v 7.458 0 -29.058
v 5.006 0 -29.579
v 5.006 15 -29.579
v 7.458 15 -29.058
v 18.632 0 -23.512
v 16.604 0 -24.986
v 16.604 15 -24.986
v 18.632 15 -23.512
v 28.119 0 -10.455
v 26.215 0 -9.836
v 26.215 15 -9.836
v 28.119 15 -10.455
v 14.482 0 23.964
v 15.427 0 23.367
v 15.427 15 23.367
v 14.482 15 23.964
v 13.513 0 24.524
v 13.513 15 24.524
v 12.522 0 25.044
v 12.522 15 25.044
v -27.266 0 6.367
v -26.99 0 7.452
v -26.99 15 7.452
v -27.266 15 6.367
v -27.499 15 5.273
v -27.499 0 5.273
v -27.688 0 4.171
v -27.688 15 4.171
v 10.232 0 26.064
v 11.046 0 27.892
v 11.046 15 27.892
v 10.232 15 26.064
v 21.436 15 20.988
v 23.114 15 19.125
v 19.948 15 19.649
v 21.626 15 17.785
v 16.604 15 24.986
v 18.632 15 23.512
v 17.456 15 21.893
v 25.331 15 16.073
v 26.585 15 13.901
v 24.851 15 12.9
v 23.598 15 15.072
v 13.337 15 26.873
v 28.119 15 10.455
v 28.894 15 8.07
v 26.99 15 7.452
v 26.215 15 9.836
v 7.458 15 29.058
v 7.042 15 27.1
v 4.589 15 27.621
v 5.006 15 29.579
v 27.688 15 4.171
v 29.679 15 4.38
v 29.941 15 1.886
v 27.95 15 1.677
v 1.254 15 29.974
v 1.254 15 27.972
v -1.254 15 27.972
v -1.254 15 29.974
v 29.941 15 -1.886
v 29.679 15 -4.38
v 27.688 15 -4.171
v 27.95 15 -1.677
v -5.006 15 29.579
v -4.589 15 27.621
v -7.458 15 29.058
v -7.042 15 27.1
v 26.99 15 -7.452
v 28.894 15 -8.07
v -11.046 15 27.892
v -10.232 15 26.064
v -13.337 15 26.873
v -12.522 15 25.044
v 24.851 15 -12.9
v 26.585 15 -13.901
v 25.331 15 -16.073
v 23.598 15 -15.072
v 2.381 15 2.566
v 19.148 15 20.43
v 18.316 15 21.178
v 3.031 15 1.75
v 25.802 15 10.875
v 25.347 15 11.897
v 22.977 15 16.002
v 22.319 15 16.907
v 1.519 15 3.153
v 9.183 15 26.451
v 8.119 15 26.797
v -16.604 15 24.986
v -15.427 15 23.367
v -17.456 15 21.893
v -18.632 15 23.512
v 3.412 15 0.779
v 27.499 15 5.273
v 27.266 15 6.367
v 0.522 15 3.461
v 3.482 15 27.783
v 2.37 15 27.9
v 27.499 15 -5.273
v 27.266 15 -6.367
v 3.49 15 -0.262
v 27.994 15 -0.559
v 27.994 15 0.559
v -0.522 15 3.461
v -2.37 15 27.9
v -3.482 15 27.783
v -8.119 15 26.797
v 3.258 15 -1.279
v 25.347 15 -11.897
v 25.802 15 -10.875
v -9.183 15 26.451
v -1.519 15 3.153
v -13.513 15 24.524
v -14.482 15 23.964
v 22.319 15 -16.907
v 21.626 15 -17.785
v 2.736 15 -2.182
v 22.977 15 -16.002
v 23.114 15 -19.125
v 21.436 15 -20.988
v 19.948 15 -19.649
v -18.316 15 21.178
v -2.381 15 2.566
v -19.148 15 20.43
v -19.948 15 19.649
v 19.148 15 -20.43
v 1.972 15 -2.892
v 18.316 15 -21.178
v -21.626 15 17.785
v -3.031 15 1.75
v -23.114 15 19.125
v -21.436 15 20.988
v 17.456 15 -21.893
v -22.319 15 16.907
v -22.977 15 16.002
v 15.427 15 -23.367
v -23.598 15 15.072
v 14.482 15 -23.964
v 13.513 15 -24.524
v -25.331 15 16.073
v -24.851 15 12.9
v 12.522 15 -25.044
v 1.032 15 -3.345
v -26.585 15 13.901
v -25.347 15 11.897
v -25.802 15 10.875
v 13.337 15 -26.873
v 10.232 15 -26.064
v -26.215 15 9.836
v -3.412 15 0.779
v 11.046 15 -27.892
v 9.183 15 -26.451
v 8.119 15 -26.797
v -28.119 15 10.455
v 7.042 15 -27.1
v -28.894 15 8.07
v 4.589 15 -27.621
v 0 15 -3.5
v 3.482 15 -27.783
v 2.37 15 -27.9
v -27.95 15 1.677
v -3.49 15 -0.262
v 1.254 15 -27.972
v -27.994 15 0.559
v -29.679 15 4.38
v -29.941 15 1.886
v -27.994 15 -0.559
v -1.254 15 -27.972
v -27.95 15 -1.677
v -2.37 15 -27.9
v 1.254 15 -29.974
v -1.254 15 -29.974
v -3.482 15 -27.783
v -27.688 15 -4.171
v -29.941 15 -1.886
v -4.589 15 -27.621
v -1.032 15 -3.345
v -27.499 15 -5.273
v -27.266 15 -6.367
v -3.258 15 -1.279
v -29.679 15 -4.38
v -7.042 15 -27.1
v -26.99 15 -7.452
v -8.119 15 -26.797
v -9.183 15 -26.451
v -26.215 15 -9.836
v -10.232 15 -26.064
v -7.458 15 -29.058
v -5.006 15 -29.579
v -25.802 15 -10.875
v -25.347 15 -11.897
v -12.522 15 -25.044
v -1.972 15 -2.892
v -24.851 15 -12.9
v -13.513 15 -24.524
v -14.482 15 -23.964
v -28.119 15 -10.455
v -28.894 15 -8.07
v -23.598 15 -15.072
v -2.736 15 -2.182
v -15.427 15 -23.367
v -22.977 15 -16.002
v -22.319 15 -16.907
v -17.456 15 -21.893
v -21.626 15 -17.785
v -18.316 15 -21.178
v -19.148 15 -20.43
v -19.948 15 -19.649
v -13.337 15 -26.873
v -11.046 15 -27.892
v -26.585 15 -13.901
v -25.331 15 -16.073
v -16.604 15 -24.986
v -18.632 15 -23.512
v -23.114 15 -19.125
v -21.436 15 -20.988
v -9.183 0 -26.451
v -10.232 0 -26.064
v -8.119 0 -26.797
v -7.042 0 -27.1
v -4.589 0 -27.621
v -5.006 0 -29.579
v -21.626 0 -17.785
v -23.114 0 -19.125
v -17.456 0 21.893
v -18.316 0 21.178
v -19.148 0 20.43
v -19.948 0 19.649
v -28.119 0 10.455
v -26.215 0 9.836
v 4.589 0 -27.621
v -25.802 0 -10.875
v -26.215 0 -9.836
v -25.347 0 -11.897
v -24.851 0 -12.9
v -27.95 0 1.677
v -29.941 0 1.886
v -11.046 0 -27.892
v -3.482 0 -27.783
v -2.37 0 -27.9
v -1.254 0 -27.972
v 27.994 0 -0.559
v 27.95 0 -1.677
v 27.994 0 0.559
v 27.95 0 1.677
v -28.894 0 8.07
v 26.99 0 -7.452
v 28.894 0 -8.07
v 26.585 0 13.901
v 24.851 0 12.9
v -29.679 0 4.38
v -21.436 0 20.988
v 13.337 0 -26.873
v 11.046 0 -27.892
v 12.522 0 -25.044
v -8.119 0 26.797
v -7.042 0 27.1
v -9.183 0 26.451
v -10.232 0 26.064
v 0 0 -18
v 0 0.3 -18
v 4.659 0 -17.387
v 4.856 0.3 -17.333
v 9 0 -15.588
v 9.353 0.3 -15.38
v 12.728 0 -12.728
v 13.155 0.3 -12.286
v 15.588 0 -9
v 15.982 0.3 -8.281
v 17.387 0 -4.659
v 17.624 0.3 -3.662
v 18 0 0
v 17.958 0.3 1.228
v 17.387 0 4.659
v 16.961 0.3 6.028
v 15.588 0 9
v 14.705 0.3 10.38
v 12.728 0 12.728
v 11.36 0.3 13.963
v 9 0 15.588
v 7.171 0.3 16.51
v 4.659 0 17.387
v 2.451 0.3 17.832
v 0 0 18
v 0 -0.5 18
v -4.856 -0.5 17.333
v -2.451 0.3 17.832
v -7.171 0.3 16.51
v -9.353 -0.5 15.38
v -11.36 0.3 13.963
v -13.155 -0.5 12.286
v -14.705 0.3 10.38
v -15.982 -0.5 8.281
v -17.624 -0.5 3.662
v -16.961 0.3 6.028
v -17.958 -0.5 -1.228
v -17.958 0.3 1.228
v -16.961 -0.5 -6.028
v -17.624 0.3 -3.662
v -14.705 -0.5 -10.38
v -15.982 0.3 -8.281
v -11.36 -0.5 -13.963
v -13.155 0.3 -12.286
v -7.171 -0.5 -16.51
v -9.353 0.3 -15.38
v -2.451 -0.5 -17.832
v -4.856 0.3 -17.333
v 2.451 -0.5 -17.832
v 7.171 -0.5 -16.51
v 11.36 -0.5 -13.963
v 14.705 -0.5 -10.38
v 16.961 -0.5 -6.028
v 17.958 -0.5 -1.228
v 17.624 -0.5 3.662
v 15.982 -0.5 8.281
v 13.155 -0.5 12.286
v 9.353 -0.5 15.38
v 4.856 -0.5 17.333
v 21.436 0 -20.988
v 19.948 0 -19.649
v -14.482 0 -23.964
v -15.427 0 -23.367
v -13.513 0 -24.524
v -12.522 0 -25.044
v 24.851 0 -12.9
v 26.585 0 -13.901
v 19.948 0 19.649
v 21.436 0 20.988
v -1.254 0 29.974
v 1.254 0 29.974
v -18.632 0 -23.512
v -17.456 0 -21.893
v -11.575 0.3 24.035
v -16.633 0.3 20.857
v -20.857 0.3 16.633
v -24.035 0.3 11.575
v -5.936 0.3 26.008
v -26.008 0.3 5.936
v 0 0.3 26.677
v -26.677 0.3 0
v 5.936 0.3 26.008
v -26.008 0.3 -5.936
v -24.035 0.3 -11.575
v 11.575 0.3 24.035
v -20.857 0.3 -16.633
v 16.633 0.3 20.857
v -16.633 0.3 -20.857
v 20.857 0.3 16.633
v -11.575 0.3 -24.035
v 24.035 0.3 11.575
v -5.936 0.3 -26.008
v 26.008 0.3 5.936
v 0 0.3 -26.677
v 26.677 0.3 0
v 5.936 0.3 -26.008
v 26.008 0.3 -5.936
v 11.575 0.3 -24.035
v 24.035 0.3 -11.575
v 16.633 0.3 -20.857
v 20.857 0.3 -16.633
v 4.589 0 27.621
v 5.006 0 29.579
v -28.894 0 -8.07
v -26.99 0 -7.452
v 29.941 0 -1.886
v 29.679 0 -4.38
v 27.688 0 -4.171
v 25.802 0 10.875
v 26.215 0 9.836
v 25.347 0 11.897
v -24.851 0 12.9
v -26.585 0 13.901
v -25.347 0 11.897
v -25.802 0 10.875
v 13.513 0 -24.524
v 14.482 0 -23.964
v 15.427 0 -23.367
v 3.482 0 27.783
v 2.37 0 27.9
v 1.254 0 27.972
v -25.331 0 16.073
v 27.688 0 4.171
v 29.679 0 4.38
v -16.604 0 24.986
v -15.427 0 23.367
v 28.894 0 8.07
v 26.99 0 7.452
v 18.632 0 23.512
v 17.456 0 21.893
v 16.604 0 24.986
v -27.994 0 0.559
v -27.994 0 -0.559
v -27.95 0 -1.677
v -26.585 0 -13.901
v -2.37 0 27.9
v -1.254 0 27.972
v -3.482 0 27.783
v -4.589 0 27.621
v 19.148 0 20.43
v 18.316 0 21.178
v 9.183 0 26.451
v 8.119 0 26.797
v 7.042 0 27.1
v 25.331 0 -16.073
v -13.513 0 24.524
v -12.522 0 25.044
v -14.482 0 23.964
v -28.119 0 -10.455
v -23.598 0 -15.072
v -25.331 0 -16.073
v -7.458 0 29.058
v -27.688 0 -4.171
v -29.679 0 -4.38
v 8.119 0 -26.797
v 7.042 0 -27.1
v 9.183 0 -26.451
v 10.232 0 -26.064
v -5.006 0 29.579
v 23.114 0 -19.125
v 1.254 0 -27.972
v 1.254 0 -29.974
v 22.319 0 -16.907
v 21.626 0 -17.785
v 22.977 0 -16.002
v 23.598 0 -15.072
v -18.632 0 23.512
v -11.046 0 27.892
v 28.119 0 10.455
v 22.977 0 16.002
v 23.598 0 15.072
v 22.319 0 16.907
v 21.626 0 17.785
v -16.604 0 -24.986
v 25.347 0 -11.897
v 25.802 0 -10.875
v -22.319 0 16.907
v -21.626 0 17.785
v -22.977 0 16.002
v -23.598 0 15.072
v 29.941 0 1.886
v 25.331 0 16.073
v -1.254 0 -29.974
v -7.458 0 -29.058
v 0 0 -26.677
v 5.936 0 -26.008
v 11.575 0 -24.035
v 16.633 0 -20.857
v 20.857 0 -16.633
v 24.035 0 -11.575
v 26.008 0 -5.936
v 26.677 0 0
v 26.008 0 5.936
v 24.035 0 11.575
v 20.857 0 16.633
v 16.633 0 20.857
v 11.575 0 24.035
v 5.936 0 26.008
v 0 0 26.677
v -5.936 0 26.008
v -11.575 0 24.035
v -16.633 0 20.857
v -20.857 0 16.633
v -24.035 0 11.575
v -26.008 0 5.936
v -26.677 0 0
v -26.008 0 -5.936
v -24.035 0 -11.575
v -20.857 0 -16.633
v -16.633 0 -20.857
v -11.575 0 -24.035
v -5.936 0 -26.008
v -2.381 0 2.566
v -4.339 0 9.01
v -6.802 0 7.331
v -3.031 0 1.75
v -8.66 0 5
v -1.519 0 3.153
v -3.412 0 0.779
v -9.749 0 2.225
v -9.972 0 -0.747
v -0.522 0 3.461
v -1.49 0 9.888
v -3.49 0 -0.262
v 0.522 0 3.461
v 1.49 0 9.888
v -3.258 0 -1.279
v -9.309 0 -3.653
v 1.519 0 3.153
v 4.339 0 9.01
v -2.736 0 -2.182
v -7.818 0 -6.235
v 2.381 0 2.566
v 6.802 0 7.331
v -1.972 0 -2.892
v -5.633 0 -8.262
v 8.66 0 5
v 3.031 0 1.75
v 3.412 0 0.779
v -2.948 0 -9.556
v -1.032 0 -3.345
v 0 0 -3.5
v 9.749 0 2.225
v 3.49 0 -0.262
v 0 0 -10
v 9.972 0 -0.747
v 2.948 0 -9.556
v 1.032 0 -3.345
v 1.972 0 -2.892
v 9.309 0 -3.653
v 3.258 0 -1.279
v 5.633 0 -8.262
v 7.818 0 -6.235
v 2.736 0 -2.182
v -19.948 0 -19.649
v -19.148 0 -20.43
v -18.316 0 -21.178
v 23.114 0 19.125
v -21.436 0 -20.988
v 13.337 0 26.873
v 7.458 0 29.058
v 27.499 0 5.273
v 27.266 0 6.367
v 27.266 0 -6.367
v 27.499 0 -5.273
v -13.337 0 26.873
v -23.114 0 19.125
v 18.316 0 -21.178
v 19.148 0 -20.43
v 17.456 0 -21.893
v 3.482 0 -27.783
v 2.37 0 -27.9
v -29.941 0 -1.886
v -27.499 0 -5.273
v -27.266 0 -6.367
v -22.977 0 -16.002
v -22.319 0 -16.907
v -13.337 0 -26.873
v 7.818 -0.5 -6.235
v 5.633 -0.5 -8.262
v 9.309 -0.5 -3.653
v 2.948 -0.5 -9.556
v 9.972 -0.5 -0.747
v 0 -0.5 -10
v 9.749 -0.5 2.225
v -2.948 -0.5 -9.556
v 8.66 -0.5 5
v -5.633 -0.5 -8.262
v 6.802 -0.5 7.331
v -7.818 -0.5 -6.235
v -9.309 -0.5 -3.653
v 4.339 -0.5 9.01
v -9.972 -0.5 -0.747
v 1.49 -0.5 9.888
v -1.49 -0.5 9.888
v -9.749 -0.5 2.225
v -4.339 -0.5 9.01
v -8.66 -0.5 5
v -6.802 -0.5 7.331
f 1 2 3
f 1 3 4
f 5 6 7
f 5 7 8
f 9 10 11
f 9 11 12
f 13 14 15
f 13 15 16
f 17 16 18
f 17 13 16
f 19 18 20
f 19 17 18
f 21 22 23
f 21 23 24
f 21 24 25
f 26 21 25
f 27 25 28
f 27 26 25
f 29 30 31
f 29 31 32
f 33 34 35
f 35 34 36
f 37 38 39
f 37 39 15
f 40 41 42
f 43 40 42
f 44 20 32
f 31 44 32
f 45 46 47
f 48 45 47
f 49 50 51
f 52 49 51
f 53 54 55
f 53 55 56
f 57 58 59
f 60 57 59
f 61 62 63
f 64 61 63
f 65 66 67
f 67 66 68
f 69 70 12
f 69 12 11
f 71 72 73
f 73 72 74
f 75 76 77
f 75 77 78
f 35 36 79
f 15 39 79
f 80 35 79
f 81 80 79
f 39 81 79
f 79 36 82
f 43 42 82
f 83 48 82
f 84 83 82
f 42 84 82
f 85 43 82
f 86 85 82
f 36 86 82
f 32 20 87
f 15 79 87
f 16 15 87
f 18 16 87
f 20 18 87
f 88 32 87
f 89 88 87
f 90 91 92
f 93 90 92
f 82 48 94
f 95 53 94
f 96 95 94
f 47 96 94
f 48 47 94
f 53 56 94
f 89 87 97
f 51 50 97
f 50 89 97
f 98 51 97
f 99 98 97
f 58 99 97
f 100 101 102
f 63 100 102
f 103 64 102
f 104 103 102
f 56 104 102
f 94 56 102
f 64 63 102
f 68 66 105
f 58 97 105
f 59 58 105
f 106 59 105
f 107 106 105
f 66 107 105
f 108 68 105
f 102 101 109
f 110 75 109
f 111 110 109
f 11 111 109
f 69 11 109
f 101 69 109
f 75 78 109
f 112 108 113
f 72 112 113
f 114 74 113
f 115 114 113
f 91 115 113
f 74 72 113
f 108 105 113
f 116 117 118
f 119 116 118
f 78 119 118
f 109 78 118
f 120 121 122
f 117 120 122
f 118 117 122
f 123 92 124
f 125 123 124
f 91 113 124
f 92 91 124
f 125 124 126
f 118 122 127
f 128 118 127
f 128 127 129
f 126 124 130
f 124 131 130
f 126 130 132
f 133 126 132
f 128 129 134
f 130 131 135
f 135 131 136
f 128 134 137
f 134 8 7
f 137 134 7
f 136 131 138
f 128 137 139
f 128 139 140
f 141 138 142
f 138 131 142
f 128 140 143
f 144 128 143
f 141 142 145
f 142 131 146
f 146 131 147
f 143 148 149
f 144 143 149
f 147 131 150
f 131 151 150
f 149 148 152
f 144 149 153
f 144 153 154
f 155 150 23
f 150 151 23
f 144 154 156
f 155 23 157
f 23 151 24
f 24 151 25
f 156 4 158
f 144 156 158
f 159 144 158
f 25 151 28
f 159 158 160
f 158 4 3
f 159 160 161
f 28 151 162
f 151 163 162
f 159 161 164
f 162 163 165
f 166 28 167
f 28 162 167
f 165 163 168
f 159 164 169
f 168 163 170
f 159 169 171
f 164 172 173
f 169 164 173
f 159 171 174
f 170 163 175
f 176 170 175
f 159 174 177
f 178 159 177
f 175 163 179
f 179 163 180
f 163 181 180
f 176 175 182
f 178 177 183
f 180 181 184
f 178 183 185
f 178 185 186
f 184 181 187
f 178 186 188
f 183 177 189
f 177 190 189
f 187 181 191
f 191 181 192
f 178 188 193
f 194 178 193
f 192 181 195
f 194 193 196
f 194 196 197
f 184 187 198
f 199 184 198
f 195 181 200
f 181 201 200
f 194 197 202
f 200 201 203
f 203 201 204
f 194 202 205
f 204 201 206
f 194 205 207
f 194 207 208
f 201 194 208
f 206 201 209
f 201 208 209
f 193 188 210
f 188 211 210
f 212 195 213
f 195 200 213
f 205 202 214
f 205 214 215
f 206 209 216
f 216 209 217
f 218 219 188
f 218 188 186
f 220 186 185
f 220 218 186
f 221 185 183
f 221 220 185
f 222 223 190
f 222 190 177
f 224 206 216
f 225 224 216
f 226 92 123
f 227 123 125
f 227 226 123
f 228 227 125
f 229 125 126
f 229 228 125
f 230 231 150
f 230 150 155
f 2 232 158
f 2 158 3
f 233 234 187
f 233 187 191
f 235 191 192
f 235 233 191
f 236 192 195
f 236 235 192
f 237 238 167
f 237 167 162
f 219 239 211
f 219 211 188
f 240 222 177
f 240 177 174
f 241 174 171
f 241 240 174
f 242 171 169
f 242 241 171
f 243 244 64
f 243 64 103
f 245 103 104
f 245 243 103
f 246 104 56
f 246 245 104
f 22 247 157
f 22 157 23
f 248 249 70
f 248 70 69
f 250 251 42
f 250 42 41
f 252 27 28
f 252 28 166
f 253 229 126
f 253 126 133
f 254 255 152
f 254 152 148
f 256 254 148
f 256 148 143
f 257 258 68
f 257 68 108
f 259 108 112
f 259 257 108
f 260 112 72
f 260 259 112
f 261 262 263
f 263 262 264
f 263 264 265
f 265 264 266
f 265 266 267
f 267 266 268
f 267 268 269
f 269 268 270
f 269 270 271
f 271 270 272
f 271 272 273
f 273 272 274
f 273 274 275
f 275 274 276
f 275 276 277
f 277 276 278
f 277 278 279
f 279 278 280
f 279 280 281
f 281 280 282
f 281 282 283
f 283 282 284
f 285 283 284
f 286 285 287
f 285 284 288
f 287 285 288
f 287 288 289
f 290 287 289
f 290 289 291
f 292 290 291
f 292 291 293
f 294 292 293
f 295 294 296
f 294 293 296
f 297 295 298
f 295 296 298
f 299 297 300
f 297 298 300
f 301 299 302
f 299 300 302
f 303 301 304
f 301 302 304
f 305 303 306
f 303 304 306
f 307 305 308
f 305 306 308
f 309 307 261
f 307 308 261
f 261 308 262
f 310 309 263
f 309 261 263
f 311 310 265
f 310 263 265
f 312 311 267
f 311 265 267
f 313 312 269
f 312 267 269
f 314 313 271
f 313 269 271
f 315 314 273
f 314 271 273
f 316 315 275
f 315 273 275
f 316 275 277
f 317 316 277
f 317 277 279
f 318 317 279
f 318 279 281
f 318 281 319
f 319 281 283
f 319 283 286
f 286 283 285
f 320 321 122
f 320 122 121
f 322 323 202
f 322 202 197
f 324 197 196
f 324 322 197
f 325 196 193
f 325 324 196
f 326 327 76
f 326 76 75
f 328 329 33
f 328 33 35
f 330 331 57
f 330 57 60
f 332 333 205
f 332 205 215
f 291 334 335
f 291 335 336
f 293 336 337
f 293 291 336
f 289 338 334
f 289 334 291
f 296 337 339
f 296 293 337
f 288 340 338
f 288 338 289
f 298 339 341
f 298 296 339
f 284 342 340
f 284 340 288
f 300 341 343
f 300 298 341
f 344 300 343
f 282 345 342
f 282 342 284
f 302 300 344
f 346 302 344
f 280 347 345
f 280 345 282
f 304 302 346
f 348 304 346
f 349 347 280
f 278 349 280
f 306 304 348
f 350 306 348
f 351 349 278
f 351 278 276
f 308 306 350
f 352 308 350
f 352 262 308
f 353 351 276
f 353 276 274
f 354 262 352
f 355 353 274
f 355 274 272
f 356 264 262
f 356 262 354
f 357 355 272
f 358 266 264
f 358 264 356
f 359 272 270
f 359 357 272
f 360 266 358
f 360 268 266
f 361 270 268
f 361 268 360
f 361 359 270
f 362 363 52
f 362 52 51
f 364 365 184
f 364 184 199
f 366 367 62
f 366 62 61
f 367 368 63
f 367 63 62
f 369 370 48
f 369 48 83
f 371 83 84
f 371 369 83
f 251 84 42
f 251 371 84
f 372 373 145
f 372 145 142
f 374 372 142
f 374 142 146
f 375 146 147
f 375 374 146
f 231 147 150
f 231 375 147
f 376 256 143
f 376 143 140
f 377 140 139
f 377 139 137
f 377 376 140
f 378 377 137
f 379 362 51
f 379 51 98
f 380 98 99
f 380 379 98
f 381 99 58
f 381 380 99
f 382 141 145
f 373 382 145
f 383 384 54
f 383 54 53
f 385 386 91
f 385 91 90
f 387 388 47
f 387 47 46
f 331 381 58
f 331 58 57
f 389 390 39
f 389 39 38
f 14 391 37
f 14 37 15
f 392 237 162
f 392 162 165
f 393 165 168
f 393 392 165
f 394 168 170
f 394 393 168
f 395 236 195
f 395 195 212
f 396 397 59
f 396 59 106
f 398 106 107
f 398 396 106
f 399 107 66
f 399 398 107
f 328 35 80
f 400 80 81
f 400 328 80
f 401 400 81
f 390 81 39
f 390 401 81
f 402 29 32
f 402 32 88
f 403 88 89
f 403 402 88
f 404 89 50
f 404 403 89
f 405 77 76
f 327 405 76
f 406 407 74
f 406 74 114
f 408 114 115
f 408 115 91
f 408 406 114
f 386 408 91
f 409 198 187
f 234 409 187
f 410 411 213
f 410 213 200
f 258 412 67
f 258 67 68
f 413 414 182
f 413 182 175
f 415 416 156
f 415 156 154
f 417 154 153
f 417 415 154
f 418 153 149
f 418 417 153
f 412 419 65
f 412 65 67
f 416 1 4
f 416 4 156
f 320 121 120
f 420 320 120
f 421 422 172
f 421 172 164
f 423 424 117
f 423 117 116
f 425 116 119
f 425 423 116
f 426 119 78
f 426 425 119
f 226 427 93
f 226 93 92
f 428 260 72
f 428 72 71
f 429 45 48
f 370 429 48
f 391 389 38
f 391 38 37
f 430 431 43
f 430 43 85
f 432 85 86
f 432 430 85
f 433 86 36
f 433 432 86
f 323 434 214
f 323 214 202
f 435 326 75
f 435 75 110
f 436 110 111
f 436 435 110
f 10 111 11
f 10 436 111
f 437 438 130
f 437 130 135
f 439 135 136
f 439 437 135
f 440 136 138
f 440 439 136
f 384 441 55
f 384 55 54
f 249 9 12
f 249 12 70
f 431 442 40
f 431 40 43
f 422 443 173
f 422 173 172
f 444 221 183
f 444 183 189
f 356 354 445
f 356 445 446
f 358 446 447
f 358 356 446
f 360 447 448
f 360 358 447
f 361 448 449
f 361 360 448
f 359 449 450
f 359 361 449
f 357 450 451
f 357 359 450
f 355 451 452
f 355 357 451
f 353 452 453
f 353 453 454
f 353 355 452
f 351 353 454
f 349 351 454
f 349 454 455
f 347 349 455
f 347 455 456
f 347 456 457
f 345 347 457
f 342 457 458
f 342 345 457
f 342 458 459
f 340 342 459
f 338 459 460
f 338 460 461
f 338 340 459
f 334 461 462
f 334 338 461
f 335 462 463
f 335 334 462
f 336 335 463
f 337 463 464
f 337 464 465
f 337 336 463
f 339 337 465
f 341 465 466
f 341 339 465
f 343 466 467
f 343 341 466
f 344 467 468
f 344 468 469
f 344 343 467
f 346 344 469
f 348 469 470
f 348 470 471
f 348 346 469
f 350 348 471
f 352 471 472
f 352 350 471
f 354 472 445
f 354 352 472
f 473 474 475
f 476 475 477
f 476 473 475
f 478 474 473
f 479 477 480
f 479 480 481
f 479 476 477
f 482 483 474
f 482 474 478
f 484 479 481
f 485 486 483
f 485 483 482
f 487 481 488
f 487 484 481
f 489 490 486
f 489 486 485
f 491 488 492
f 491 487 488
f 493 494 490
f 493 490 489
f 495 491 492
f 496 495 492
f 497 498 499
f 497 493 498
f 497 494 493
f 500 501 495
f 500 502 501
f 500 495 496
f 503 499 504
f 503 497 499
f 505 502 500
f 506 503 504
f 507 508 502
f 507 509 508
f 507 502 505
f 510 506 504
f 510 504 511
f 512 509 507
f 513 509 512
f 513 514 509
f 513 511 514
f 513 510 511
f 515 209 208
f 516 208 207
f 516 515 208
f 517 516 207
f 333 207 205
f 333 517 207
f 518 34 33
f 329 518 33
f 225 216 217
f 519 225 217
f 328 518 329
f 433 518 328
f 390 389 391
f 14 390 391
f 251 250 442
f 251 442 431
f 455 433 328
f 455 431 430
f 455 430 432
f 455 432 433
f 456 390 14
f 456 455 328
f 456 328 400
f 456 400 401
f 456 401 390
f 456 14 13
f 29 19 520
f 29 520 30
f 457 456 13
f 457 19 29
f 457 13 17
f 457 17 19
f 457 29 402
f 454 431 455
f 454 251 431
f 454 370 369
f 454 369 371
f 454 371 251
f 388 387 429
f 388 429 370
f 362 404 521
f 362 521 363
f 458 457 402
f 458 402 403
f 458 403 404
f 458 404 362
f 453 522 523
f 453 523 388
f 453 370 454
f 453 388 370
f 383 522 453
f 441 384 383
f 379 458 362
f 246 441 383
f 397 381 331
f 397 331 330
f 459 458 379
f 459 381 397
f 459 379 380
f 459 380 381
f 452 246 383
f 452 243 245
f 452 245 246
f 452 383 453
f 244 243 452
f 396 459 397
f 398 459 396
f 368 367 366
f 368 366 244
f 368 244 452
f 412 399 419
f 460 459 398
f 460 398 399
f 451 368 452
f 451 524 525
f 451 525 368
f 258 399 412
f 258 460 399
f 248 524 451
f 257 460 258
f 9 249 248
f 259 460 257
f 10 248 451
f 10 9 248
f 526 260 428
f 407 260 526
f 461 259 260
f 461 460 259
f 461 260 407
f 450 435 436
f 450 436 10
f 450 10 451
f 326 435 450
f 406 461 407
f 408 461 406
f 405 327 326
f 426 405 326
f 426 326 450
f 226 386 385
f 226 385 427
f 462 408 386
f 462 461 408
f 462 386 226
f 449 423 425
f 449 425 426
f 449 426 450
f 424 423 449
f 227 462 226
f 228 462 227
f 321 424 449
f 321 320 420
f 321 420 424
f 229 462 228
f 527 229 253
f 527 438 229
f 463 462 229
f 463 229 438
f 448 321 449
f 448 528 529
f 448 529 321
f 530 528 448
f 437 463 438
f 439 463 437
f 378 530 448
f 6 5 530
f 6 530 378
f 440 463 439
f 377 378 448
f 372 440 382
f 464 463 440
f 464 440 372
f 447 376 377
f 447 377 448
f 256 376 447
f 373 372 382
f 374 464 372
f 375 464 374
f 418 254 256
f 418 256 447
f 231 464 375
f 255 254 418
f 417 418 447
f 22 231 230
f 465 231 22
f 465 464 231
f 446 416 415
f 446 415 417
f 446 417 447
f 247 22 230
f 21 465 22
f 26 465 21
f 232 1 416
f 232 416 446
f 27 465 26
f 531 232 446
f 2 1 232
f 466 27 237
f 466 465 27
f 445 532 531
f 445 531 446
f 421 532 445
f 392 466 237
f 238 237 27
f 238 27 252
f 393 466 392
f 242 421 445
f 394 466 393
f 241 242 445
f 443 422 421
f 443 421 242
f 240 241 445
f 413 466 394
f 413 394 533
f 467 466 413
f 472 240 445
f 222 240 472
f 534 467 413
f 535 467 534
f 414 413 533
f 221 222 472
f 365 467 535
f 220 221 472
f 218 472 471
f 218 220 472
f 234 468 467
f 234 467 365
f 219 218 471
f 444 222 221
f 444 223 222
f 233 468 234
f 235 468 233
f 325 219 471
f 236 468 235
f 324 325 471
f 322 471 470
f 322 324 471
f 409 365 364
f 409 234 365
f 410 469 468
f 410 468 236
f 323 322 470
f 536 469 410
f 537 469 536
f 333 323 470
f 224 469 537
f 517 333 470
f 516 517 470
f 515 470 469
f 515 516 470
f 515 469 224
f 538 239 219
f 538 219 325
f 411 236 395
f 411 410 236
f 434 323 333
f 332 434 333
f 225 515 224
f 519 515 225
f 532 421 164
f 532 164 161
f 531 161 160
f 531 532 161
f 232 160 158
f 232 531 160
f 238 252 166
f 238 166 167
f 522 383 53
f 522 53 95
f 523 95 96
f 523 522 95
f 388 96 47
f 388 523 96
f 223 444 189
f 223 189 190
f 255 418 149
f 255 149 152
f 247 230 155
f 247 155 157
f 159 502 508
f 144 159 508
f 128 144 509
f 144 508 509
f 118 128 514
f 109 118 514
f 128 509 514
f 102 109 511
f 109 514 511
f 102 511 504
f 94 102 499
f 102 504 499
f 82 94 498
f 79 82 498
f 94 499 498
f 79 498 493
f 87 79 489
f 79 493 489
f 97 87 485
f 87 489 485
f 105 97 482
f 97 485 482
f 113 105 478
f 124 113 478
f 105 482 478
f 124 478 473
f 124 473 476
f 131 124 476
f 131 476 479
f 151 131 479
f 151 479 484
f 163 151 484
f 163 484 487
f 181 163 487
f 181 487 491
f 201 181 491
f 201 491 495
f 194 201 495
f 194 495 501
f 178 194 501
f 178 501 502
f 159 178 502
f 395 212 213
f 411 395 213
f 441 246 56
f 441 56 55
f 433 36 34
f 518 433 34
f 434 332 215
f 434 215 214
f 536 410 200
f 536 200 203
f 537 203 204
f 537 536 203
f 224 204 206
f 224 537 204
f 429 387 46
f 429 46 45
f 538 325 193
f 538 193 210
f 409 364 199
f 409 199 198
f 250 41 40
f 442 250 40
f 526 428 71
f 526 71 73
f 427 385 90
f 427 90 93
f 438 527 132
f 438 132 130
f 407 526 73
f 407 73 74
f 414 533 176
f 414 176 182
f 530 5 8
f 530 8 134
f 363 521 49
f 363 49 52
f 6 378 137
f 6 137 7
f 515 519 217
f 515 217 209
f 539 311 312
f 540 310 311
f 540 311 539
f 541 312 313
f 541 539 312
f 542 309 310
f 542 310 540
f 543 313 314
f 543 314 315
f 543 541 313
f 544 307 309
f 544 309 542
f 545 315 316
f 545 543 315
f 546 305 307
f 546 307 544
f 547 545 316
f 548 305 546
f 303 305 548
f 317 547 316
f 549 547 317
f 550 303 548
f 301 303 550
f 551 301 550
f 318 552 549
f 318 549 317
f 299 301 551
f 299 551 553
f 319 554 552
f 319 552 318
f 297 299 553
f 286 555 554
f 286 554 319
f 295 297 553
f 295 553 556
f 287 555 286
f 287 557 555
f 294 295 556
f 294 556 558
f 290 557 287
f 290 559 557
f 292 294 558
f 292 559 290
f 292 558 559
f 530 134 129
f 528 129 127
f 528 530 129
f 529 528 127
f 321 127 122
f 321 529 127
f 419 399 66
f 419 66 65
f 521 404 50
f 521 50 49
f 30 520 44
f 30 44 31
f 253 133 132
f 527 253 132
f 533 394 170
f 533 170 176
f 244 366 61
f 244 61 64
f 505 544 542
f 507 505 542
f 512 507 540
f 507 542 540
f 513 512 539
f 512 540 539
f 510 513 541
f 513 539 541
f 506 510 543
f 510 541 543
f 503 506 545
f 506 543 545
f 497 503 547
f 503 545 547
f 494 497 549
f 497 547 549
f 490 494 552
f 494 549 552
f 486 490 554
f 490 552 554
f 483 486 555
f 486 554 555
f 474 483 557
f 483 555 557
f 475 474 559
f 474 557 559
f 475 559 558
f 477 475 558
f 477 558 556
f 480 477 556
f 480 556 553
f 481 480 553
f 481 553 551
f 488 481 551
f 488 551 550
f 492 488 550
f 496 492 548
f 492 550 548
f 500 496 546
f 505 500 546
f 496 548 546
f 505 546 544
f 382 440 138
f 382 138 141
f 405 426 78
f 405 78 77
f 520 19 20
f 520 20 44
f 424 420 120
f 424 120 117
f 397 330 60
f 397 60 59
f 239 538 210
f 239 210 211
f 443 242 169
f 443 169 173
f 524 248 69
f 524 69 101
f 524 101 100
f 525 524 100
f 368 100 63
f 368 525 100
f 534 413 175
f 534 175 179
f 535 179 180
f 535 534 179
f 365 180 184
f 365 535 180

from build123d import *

# Parameters (mm, degrees)
SALIENTE_EXTRUIR1_DEPTH = 15
CROQUIS3_R              = 18
SALIENTE_EXTRUIR2_DEPTH = 0.5
CROQUIS4_R              = 3.5
CORTAR_EXTRUIR1_DEPTH   = 24.5
CROQUIS5_R              = 10
CORTAR_EXTRUIR2_DEPTH   = 0.5
CORTAR_EXTRUIR3_START   = -0.3
CROQUIS6_R              = 26.676513241
CROQUIS6_R_2            = 18
CORTAR_EXTRUIR3_DEPTH   = 0.3


with BuildPart() as part:
    # Croquis2 → Saliente-Extruir1 (new body)
    with BuildSketch(Plane(origin=(0, 0, 0), x_dir=(1, 0, 0), z_dir=(0, 1, 0))):
        with BuildLine():
            Line((-1.253633745, 27.971921679), (-1.253633745, 29.973795262))
            Line((-1.253633745, 29.973795262), (1.253633745, 29.973795262))
            Line((1.253633745, 29.973795262), (1.253633745, 27.971921679))
            ThreePointArc((1.253633745, 27.971921679), (2.926796971, 27.84661307), (4.589450692, 27.62131319))
            Line((4.589450692, 27.62131319), (5.005663613, 29.579441032))
            Line((5.005663613, 29.579441032), (7.458141293, 29.058150809))
            Line((7.458141293, 29.058150809), (7.041928372, 27.100022967))
            ThreePointArc((7.041928372, 27.100022967), (8.652475842, 26.629582456), (10.231954111, 26.063520773))
            Line((10.231954111, 26.063520773), (11.046189452, 27.892323292))
            Line((11.046189452, 27.892323292), (13.336692279, 26.872525729))
            Line((13.336692279, 26.872525729), (12.522456938, 25.04372321))
            ThreePointArc((12.522456938, 25.04372321), (14, 24.248711306), (15.427272037, 23.366627431))
            Line((15.427272037, 23.366627431), (16.603943806, 24.98617718))
            Line((16.603943806, 24.98617718), (18.632365815, 23.512442326))
            Line((18.632365815, 23.512442326), (17.455694046, 21.892892577))
            ThreePointArc((17.455694046, 21.892892577), (18.735656978, 20.808055113), (19.948344146, 19.648500345))
            Line((19.948344146, 19.648500345), (21.436026141, 20.98801523))
            Line((21.436026141, 20.98801523), (23.113715557, 19.124752368))
            Line((23.113715557, 19.124752368), (21.626033563, 17.785237483))
            ThreePointArc((21.626033563, 17.785237483), (22.652475842, 16.457987064), (23.597577894, 15.07163951))
            Line((23.597577894, 15.07163951), (25.331251272, 16.072576302))
            Line((25.331251272, 16.072576302), (26.584885018, 13.901218961))
            Line((26.584885018, 13.901218961), (24.85121164, 12.900282169))
            ThreePointArc((24.85121164, 12.900282169), (25.579272814, 11.388626006), (26.215484254, 9.836075707))
            Line((26.215484254, 9.836075707), (28.11937917, 10.454688665))
            Line((28.11937917, 10.454688665), (28.894167434, 8.070135579))
            Line((28.894167434, 8.070135579), (26.990272518, 7.451522622))
            ThreePointArc((26.990272518, 7.451522622), (27.388132821, 5.821527343), (27.687648157, 4.170628196))
            Line((27.687648157, 4.170628196), (29.678555267, 4.379880966))
            Line((29.678555267, 4.379880966), (29.940636085, 1.886348549))
            Line((29.940636085, 1.886348549), (27.949728974, 1.677095779))
            ThreePointArc((27.949728974, 1.677095779), (28, 0), (27.949728974, -1.677095779))
            Line((27.949728974, -1.677095779), (29.940636085, -1.886348549))
            Line((29.940636085, -1.886348549), (29.678555267, -4.379880966))
            Line((29.678555267, -4.379880966), (27.687648157, -4.170628196))
            ThreePointArc((27.687648157, -4.170628196), (27.388132821, -5.821527343), (26.990272518, -7.451522622))
            Line((26.990272518, -7.451522622), (28.894167434, -8.070135579))
            Line((28.894167434, -8.070135579), (28.11937917, -10.454688665))
            Line((28.11937917, -10.454688665), (26.215484254, -9.836075707))
            ThreePointArc((26.215484254, -9.836075707), (25.579272814, -11.388626006), (24.85121164, -12.900282169))
            Line((24.85121164, -12.900282169), (26.584885018, -13.901218961))
            Line((26.584885018, -13.901218961), (25.331251272, -16.072576302))
            Line((25.331251272, -16.072576302), (23.597577894, -15.07163951))
            ThreePointArc((23.597577894, -15.07163951), (22.652475842, -16.457987064), (21.626033563, -17.785237483))
            Line((21.626033563, -17.785237483), (23.113715557, -19.124752368))
            Line((23.113715557, -19.124752368), (21.436026141, -20.98801523))
            Line((21.436026141, -20.98801523), (19.948344146, -19.648500345))
            ThreePointArc((19.948344146, -19.648500345), (18.735656978, -20.808055113), (17.455694046, -21.892892577))
            Line((17.455694046, -21.892892577), (18.632365815, -23.512442326))
            Line((18.632365815, -23.512442326), (16.603943806, -24.98617718))
            Line((16.603943806, -24.98617718), (15.427272037, -23.366627431))
            ThreePointArc((15.427272037, -23.366627431), (14, -24.248711306), (12.522456938, -25.04372321))
            Line((12.522456938, -25.04372321), (13.336692279, -26.872525729))
            Line((13.336692279, -26.872525729), (11.046189452, -27.892323292))
            Line((11.046189452, -27.892323292), (10.231954111, -26.063520773))
            ThreePointArc((10.231954111, -26.063520773), (8.652475842, -26.629582456), (7.041928372, -27.100022967))
            Line((7.041928372, -27.100022967), (7.458141293, -29.058150809))
            Line((7.458141293, -29.058150809), (5.005663613, -29.579441032))
            Line((5.005663613, -29.579441032), (4.589450692, -27.62131319))
            ThreePointArc((4.589450692, -27.62131319), (2.926796971, -27.84661307), (1.253633745, -27.971921679))
            Line((1.253633745, -27.971921679), (1.253633745, -29.973795262))
            Line((1.253633745, -29.973795262), (-1.253633745, -29.973795262))
            Line((-1.253633745, -29.973795262), (-1.253633745, -27.971921679))
            ThreePointArc((-1.253633745, -27.971921679), (-2.926796971, -27.84661307), (-4.589450692, -27.62131319))
            Line((-4.589450692, -27.62131319), (-5.005663613, -29.579441032))
            Line((-5.005663613, -29.579441032), (-7.458141293, -29.058150809))
            Line((-7.458141293, -29.058150809), (-7.041928372, -27.100022967))
            ThreePointArc((-7.041928372, -27.100022967), (-8.652475842, -26.629582456), (-10.231954111, -26.063520773))
            Line((-10.231954111, -26.063520773), (-11.046189452, -27.892323292))
            Line((-11.046189452, -27.892323292), (-13.336692279, -26.872525729))
            Line((-13.336692279, -26.872525729), (-12.522456938, -25.04372321))
            ThreePointArc((-12.522456938, -25.04372321), (-14, -24.248711306), (-15.427272037, -23.366627431))
            Line((-15.427272037, -23.366627431), (-16.603943806, -24.98617718))
            Line((-16.603943806, -24.98617718), (-18.632365815, -23.512442326))
            Line((-18.632365815, -23.512442326), (-17.455694046, -21.892892577))
            ThreePointArc((-17.455694046, -21.892892577), (-18.735656978, -20.808055113), (-19.948344146, -19.648500345))
            Line((-19.948344146, -19.648500345), (-21.436026141, -20.98801523))
            Line((-21.436026141, -20.98801523), (-23.113715557, -19.124752368))
            Line((-23.113715557, -19.124752368), (-21.626033563, -17.785237483))
            ThreePointArc((-21.626033563, -17.785237483), (-22.652475842, -16.457987064), (-23.597577894, -15.07163951))
            Line((-23.597577894, -15.07163951), (-25.331251272, -16.072576302))
            Line((-25.331251272, -16.072576302), (-26.584885018, -13.901218961))
            Line((-26.584885018, -13.901218961), (-24.85121164, -12.900282169))
            ThreePointArc((-24.85121164, -12.900282169), (-25.579272814, -11.388626006), (-26.215484254, -9.836075707))
            Line((-26.215484254, -9.836075707), (-28.11937917, -10.454688665))
            Line((-28.11937917, -10.454688665), (-28.894167434, -8.070135579))
            Line((-28.894167434, -8.070135579), (-26.990272518, -7.451522622))
            ThreePointArc((-26.990272518, -7.451522622), (-27.388132821, -5.821527343), (-27.687648157, -4.170628196))
            Line((-27.687648157, -4.170628196), (-29.678555267, -4.379880966))
            Line((-29.678555267, -4.379880966), (-29.940636085, -1.886348549))
            Line((-29.940636085, -1.886348549), (-27.949728974, -1.677095779))
            ThreePointArc((-27.949728974, -1.677095779), (-28, 0), (-27.949728974, 1.677095779))
            Line((-27.949728974, 1.677095779), (-29.940636085, 1.886348549))
            Line((-29.940636085, 1.886348549), (-29.678555267, 4.379880966))
            Line((-29.678555267, 4.379880966), (-27.687648157, 4.170628196))
            ThreePointArc((-27.687648157, 4.170628196), (-27.388132821, 5.821527343), (-26.990272518, 7.451522622))
            Line((-26.990272518, 7.451522622), (-28.894167434, 8.070135579))
            Line((-28.894167434, 8.070135579), (-28.11937917, 10.454688665))
            Line((-28.11937917, 10.454688665), (-26.215484254, 9.836075707))
            ThreePointArc((-26.215484254, 9.836075707), (-25.579272814, 11.388626006), (-24.85121164, 12.900282169))
            Line((-24.85121164, 12.900282169), (-26.584885018, 13.901218961))
            Line((-26.584885018, 13.901218961), (-25.331251272, 16.072576302))
            Line((-25.331251272, 16.072576302), (-23.597577894, 15.07163951))
            ThreePointArc((-23.597577894, 15.07163951), (-22.652475842, 16.457987064), (-21.626033563, 17.785237483))
            Line((-21.626033563, 17.785237483), (-23.113715557, 19.124752368))
            Line((-23.113715557, 19.124752368), (-21.436026141, 20.98801523))
            Line((-21.436026141, 20.98801523), (-19.948344146, 19.648500345))
            ThreePointArc((-19.948344146, 19.648500345), (-18.735656978, 20.808055113), (-17.455694046, 21.892892577))
            Line((-17.455694046, 21.892892577), (-18.632365815, 23.512442326))
            Line((-18.632365815, 23.512442326), (-16.603943806, 24.98617718))
            Line((-16.603943806, 24.98617718), (-15.427272037, 23.366627431))
            ThreePointArc((-15.427272037, 23.366627431), (-14, 24.248711306), (-12.522456938, 25.04372321))
            Line((-12.522456938, 25.04372321), (-13.336692279, 26.872525729))
            Line((-13.336692279, 26.872525729), (-11.046189452, 27.892323292))
            Line((-11.046189452, 27.892323292), (-10.231954111, 26.063520773))
            ThreePointArc((-10.231954111, 26.063520773), (-8.652475842, 26.629582456), (-7.041928372, 27.100022967))
            Line((-7.041928372, 27.100022967), (-7.458141293, 29.058150809))
            Line((-7.458141293, 29.058150809), (-5.005663613, 29.579441032))
            Line((-5.005663613, 29.579441032), (-4.589450692, 27.62131319))
            ThreePointArc((-4.589450692, 27.62131319), (-2.926796971, 27.84661307), (-1.253633745, 27.971921679))
        make_face()
    extrude(amount=SALIENTE_EXTRUIR1_DEPTH)

    # Croquis3 → Saliente-Extruir2 (add)
    with BuildSketch(Plane.XZ):
        with Locations(Location((0, 0, 0), (0, 0, 90))):
            Circle(CROQUIS3_R)
    extrude(amount=SALIENTE_EXTRUIR2_DEPTH)

    # Croquis4 → Cortar-Extruir1 (cut)
    with BuildSketch(Plane.XZ.offset(0.5)):
        with Locations(Location((0, 0, 0), (0, 0, 270))):
            Circle(CROQUIS4_R)
    extrude(amount=-CORTAR_EXTRUIR1_DEPTH, mode=Mode.SUBTRACT)

    # Croquis5 → Cortar-Extruir2 (cut)
    with BuildSketch(Plane(origin=(0, -0.5, 0), x_dir=(-1, 0, 0), z_dir=(0, -1, 0))):
        with Locations(Location((0, 0, 0), (0, 0, 90))):
            Circle(CROQUIS5_R)
    extrude(amount=-CORTAR_EXTRUIR2_DEPTH, mode=Mode.SUBTRACT)

    # Croquis6 → Cortar-Extruir3 (cut)
    with BuildSketch(Plane.XZ.offset(CORTAR_EXTRUIR3_START)):
        with Locations(Location((0, 0, 0), (0, 0, 270))):
            Circle(CROQUIS6_R)
        with Locations(Location((0, 0, 0), (0, 0, 270))):
            Circle(CROQUIS6_R_2, mode=Mode.SUBTRACT)
    extrude(amount=CORTAR_EXTRUIR3_DEPTH, mode=Mode.SUBTRACT)


solid = part.part
